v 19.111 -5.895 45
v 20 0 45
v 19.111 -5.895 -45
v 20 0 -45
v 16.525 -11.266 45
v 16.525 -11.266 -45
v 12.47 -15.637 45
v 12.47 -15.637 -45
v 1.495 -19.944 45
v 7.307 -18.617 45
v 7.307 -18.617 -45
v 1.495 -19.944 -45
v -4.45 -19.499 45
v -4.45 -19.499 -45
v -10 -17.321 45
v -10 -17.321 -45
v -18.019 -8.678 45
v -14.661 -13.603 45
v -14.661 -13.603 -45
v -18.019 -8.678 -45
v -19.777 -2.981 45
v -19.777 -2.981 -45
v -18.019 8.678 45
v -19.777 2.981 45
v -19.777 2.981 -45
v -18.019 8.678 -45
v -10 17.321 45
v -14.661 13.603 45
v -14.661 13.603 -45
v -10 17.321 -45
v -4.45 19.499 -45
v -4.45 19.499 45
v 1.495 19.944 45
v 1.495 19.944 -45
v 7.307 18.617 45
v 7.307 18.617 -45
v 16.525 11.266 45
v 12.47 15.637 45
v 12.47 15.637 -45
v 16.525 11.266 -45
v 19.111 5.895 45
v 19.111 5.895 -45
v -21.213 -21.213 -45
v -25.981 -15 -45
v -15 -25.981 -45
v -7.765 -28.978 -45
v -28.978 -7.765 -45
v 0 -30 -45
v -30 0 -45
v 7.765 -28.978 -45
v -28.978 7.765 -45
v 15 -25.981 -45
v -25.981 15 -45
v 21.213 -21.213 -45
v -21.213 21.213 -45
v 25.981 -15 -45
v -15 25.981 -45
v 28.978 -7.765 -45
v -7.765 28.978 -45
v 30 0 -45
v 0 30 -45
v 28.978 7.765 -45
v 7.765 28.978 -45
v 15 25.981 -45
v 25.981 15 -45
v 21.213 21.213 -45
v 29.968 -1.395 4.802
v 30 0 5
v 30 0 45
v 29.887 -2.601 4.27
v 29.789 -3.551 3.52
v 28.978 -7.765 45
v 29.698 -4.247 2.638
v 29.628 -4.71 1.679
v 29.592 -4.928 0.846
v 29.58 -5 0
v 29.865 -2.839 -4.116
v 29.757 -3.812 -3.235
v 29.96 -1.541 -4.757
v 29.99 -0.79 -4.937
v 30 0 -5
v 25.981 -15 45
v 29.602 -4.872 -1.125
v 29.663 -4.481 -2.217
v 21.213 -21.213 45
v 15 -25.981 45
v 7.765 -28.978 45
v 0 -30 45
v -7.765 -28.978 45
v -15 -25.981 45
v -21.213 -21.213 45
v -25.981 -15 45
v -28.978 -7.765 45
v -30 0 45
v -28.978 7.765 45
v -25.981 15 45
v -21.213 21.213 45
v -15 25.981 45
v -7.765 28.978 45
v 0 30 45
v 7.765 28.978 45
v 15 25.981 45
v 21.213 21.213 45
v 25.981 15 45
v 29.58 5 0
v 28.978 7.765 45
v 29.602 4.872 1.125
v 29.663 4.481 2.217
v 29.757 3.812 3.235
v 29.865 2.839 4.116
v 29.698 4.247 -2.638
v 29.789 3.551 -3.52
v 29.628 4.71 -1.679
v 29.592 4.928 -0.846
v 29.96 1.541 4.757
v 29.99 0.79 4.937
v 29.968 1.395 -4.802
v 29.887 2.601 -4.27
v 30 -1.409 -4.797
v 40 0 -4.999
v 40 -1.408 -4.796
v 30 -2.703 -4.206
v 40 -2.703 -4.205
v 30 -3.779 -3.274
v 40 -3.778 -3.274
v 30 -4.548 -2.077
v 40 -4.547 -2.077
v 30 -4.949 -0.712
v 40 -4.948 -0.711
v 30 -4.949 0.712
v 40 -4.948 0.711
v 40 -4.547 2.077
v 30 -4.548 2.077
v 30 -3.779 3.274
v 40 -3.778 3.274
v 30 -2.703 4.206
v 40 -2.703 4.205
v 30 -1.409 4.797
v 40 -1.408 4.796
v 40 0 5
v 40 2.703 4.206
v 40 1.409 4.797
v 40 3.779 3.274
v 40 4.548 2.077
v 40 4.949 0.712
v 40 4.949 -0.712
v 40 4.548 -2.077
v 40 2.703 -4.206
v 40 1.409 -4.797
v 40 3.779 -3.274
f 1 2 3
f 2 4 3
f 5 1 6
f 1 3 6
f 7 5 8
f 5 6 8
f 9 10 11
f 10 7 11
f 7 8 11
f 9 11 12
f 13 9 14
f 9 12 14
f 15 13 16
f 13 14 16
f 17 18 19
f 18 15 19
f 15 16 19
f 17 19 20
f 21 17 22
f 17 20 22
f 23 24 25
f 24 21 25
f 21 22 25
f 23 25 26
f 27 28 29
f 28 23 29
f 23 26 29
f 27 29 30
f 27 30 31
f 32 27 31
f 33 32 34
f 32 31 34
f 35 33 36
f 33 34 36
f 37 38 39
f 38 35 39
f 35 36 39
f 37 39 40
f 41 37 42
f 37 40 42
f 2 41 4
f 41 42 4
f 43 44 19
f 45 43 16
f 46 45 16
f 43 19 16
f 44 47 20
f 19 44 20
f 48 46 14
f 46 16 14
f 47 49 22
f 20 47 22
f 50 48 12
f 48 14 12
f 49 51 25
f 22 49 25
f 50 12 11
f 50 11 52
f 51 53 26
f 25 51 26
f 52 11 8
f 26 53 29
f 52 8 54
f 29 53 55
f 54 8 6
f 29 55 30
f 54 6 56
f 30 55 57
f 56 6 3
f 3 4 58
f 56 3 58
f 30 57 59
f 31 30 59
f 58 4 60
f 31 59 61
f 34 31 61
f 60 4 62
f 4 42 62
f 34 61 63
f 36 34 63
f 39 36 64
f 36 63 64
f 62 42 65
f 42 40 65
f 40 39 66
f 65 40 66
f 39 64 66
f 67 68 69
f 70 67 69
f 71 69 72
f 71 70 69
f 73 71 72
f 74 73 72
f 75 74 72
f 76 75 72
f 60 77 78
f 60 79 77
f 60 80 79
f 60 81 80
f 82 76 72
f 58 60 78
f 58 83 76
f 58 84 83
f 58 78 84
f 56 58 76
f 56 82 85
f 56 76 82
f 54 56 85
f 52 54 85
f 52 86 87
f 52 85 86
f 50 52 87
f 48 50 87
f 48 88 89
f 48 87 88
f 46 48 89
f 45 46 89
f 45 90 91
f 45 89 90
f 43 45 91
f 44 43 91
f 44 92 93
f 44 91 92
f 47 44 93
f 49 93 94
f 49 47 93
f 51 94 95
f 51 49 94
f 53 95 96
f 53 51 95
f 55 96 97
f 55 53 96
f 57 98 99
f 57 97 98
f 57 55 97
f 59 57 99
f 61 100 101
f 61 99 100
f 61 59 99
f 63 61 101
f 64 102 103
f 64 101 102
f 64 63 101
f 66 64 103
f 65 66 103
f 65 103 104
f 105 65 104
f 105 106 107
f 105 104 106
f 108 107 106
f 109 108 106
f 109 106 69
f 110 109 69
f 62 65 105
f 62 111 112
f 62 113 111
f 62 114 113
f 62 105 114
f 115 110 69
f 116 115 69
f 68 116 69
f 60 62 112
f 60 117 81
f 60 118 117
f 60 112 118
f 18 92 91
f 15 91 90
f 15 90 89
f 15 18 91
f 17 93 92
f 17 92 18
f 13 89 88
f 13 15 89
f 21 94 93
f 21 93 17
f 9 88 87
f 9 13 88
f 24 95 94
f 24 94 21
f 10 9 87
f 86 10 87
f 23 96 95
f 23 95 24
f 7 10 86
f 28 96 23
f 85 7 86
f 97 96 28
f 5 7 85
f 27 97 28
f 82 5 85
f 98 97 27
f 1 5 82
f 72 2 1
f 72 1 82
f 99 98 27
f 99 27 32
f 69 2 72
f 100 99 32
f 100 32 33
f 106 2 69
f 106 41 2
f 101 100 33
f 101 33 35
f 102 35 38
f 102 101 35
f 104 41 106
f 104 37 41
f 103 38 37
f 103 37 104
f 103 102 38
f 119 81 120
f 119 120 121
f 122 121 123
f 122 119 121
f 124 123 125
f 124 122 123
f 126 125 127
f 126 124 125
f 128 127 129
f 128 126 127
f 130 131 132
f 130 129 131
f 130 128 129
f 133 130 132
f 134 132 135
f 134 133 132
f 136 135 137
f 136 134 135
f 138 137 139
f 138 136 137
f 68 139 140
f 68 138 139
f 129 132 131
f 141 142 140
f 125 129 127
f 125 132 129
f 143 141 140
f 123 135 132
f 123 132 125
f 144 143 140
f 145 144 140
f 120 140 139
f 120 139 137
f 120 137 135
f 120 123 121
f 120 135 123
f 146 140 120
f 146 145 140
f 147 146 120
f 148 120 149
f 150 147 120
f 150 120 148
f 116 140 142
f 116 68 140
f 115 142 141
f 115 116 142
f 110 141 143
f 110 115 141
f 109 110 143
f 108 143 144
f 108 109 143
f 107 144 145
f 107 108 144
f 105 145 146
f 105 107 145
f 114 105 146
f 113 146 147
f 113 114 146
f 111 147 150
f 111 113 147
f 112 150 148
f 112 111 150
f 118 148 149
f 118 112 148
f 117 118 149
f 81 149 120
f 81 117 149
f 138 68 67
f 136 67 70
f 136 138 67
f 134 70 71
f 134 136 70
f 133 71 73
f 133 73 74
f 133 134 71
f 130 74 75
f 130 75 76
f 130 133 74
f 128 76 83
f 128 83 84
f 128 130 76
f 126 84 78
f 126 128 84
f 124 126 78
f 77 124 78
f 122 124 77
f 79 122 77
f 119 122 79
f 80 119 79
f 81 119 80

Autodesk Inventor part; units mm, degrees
ref_plane "YZ Plane" through (0, 0, 0) normal (1, 0, 0) x (0, 1, 0)
ref_plane "XZ Plane" through (0, 0, 0) normal (0, 1, 0) x (-1, 0, 0)
sketch "Эскиз1" plane through (0, 0, 0) normal (0, 0, 1) x (1, 0, 0)
  circle A0 centre (0, 0) radius 20
  circle A1 centre (0, 0) radius 30
  dimension "d0" = 40
  dimension "d1" = 10
extrude "Выдавливание1" add sketch "Эскиз1" along normal mid plane 90
ref_plane "РабПлоскость1" through (30, 0, 0) normal (1, 0, 0) x (0, 1, 0)
sketch "Эскиз4" plane through (30, 0, 0) normal (1, 0, 0) x (0, 1, 0)
  circle A0 centre (0, 0) radius 5
  dimension "d5" = 10
extrude "Выдавливание2" add sketch "Эскиз4" against normal up to surface
sketch "Эскиз6" plane through (30, 0, 0) normal (1, 0, 0) x (0, 0, -1)
  arc A0 (5, 0) -> (-5, 0) centre (0, 0) ccw projected
  circle A1 centre (0, 0) radius 4.9989
  point P0 (-10, 0)
  point P1 (10, 0)
extrude "Выдавливание3" add sketch "Эскиз6" along normal blind 10
properties part number "стакан_v1"
